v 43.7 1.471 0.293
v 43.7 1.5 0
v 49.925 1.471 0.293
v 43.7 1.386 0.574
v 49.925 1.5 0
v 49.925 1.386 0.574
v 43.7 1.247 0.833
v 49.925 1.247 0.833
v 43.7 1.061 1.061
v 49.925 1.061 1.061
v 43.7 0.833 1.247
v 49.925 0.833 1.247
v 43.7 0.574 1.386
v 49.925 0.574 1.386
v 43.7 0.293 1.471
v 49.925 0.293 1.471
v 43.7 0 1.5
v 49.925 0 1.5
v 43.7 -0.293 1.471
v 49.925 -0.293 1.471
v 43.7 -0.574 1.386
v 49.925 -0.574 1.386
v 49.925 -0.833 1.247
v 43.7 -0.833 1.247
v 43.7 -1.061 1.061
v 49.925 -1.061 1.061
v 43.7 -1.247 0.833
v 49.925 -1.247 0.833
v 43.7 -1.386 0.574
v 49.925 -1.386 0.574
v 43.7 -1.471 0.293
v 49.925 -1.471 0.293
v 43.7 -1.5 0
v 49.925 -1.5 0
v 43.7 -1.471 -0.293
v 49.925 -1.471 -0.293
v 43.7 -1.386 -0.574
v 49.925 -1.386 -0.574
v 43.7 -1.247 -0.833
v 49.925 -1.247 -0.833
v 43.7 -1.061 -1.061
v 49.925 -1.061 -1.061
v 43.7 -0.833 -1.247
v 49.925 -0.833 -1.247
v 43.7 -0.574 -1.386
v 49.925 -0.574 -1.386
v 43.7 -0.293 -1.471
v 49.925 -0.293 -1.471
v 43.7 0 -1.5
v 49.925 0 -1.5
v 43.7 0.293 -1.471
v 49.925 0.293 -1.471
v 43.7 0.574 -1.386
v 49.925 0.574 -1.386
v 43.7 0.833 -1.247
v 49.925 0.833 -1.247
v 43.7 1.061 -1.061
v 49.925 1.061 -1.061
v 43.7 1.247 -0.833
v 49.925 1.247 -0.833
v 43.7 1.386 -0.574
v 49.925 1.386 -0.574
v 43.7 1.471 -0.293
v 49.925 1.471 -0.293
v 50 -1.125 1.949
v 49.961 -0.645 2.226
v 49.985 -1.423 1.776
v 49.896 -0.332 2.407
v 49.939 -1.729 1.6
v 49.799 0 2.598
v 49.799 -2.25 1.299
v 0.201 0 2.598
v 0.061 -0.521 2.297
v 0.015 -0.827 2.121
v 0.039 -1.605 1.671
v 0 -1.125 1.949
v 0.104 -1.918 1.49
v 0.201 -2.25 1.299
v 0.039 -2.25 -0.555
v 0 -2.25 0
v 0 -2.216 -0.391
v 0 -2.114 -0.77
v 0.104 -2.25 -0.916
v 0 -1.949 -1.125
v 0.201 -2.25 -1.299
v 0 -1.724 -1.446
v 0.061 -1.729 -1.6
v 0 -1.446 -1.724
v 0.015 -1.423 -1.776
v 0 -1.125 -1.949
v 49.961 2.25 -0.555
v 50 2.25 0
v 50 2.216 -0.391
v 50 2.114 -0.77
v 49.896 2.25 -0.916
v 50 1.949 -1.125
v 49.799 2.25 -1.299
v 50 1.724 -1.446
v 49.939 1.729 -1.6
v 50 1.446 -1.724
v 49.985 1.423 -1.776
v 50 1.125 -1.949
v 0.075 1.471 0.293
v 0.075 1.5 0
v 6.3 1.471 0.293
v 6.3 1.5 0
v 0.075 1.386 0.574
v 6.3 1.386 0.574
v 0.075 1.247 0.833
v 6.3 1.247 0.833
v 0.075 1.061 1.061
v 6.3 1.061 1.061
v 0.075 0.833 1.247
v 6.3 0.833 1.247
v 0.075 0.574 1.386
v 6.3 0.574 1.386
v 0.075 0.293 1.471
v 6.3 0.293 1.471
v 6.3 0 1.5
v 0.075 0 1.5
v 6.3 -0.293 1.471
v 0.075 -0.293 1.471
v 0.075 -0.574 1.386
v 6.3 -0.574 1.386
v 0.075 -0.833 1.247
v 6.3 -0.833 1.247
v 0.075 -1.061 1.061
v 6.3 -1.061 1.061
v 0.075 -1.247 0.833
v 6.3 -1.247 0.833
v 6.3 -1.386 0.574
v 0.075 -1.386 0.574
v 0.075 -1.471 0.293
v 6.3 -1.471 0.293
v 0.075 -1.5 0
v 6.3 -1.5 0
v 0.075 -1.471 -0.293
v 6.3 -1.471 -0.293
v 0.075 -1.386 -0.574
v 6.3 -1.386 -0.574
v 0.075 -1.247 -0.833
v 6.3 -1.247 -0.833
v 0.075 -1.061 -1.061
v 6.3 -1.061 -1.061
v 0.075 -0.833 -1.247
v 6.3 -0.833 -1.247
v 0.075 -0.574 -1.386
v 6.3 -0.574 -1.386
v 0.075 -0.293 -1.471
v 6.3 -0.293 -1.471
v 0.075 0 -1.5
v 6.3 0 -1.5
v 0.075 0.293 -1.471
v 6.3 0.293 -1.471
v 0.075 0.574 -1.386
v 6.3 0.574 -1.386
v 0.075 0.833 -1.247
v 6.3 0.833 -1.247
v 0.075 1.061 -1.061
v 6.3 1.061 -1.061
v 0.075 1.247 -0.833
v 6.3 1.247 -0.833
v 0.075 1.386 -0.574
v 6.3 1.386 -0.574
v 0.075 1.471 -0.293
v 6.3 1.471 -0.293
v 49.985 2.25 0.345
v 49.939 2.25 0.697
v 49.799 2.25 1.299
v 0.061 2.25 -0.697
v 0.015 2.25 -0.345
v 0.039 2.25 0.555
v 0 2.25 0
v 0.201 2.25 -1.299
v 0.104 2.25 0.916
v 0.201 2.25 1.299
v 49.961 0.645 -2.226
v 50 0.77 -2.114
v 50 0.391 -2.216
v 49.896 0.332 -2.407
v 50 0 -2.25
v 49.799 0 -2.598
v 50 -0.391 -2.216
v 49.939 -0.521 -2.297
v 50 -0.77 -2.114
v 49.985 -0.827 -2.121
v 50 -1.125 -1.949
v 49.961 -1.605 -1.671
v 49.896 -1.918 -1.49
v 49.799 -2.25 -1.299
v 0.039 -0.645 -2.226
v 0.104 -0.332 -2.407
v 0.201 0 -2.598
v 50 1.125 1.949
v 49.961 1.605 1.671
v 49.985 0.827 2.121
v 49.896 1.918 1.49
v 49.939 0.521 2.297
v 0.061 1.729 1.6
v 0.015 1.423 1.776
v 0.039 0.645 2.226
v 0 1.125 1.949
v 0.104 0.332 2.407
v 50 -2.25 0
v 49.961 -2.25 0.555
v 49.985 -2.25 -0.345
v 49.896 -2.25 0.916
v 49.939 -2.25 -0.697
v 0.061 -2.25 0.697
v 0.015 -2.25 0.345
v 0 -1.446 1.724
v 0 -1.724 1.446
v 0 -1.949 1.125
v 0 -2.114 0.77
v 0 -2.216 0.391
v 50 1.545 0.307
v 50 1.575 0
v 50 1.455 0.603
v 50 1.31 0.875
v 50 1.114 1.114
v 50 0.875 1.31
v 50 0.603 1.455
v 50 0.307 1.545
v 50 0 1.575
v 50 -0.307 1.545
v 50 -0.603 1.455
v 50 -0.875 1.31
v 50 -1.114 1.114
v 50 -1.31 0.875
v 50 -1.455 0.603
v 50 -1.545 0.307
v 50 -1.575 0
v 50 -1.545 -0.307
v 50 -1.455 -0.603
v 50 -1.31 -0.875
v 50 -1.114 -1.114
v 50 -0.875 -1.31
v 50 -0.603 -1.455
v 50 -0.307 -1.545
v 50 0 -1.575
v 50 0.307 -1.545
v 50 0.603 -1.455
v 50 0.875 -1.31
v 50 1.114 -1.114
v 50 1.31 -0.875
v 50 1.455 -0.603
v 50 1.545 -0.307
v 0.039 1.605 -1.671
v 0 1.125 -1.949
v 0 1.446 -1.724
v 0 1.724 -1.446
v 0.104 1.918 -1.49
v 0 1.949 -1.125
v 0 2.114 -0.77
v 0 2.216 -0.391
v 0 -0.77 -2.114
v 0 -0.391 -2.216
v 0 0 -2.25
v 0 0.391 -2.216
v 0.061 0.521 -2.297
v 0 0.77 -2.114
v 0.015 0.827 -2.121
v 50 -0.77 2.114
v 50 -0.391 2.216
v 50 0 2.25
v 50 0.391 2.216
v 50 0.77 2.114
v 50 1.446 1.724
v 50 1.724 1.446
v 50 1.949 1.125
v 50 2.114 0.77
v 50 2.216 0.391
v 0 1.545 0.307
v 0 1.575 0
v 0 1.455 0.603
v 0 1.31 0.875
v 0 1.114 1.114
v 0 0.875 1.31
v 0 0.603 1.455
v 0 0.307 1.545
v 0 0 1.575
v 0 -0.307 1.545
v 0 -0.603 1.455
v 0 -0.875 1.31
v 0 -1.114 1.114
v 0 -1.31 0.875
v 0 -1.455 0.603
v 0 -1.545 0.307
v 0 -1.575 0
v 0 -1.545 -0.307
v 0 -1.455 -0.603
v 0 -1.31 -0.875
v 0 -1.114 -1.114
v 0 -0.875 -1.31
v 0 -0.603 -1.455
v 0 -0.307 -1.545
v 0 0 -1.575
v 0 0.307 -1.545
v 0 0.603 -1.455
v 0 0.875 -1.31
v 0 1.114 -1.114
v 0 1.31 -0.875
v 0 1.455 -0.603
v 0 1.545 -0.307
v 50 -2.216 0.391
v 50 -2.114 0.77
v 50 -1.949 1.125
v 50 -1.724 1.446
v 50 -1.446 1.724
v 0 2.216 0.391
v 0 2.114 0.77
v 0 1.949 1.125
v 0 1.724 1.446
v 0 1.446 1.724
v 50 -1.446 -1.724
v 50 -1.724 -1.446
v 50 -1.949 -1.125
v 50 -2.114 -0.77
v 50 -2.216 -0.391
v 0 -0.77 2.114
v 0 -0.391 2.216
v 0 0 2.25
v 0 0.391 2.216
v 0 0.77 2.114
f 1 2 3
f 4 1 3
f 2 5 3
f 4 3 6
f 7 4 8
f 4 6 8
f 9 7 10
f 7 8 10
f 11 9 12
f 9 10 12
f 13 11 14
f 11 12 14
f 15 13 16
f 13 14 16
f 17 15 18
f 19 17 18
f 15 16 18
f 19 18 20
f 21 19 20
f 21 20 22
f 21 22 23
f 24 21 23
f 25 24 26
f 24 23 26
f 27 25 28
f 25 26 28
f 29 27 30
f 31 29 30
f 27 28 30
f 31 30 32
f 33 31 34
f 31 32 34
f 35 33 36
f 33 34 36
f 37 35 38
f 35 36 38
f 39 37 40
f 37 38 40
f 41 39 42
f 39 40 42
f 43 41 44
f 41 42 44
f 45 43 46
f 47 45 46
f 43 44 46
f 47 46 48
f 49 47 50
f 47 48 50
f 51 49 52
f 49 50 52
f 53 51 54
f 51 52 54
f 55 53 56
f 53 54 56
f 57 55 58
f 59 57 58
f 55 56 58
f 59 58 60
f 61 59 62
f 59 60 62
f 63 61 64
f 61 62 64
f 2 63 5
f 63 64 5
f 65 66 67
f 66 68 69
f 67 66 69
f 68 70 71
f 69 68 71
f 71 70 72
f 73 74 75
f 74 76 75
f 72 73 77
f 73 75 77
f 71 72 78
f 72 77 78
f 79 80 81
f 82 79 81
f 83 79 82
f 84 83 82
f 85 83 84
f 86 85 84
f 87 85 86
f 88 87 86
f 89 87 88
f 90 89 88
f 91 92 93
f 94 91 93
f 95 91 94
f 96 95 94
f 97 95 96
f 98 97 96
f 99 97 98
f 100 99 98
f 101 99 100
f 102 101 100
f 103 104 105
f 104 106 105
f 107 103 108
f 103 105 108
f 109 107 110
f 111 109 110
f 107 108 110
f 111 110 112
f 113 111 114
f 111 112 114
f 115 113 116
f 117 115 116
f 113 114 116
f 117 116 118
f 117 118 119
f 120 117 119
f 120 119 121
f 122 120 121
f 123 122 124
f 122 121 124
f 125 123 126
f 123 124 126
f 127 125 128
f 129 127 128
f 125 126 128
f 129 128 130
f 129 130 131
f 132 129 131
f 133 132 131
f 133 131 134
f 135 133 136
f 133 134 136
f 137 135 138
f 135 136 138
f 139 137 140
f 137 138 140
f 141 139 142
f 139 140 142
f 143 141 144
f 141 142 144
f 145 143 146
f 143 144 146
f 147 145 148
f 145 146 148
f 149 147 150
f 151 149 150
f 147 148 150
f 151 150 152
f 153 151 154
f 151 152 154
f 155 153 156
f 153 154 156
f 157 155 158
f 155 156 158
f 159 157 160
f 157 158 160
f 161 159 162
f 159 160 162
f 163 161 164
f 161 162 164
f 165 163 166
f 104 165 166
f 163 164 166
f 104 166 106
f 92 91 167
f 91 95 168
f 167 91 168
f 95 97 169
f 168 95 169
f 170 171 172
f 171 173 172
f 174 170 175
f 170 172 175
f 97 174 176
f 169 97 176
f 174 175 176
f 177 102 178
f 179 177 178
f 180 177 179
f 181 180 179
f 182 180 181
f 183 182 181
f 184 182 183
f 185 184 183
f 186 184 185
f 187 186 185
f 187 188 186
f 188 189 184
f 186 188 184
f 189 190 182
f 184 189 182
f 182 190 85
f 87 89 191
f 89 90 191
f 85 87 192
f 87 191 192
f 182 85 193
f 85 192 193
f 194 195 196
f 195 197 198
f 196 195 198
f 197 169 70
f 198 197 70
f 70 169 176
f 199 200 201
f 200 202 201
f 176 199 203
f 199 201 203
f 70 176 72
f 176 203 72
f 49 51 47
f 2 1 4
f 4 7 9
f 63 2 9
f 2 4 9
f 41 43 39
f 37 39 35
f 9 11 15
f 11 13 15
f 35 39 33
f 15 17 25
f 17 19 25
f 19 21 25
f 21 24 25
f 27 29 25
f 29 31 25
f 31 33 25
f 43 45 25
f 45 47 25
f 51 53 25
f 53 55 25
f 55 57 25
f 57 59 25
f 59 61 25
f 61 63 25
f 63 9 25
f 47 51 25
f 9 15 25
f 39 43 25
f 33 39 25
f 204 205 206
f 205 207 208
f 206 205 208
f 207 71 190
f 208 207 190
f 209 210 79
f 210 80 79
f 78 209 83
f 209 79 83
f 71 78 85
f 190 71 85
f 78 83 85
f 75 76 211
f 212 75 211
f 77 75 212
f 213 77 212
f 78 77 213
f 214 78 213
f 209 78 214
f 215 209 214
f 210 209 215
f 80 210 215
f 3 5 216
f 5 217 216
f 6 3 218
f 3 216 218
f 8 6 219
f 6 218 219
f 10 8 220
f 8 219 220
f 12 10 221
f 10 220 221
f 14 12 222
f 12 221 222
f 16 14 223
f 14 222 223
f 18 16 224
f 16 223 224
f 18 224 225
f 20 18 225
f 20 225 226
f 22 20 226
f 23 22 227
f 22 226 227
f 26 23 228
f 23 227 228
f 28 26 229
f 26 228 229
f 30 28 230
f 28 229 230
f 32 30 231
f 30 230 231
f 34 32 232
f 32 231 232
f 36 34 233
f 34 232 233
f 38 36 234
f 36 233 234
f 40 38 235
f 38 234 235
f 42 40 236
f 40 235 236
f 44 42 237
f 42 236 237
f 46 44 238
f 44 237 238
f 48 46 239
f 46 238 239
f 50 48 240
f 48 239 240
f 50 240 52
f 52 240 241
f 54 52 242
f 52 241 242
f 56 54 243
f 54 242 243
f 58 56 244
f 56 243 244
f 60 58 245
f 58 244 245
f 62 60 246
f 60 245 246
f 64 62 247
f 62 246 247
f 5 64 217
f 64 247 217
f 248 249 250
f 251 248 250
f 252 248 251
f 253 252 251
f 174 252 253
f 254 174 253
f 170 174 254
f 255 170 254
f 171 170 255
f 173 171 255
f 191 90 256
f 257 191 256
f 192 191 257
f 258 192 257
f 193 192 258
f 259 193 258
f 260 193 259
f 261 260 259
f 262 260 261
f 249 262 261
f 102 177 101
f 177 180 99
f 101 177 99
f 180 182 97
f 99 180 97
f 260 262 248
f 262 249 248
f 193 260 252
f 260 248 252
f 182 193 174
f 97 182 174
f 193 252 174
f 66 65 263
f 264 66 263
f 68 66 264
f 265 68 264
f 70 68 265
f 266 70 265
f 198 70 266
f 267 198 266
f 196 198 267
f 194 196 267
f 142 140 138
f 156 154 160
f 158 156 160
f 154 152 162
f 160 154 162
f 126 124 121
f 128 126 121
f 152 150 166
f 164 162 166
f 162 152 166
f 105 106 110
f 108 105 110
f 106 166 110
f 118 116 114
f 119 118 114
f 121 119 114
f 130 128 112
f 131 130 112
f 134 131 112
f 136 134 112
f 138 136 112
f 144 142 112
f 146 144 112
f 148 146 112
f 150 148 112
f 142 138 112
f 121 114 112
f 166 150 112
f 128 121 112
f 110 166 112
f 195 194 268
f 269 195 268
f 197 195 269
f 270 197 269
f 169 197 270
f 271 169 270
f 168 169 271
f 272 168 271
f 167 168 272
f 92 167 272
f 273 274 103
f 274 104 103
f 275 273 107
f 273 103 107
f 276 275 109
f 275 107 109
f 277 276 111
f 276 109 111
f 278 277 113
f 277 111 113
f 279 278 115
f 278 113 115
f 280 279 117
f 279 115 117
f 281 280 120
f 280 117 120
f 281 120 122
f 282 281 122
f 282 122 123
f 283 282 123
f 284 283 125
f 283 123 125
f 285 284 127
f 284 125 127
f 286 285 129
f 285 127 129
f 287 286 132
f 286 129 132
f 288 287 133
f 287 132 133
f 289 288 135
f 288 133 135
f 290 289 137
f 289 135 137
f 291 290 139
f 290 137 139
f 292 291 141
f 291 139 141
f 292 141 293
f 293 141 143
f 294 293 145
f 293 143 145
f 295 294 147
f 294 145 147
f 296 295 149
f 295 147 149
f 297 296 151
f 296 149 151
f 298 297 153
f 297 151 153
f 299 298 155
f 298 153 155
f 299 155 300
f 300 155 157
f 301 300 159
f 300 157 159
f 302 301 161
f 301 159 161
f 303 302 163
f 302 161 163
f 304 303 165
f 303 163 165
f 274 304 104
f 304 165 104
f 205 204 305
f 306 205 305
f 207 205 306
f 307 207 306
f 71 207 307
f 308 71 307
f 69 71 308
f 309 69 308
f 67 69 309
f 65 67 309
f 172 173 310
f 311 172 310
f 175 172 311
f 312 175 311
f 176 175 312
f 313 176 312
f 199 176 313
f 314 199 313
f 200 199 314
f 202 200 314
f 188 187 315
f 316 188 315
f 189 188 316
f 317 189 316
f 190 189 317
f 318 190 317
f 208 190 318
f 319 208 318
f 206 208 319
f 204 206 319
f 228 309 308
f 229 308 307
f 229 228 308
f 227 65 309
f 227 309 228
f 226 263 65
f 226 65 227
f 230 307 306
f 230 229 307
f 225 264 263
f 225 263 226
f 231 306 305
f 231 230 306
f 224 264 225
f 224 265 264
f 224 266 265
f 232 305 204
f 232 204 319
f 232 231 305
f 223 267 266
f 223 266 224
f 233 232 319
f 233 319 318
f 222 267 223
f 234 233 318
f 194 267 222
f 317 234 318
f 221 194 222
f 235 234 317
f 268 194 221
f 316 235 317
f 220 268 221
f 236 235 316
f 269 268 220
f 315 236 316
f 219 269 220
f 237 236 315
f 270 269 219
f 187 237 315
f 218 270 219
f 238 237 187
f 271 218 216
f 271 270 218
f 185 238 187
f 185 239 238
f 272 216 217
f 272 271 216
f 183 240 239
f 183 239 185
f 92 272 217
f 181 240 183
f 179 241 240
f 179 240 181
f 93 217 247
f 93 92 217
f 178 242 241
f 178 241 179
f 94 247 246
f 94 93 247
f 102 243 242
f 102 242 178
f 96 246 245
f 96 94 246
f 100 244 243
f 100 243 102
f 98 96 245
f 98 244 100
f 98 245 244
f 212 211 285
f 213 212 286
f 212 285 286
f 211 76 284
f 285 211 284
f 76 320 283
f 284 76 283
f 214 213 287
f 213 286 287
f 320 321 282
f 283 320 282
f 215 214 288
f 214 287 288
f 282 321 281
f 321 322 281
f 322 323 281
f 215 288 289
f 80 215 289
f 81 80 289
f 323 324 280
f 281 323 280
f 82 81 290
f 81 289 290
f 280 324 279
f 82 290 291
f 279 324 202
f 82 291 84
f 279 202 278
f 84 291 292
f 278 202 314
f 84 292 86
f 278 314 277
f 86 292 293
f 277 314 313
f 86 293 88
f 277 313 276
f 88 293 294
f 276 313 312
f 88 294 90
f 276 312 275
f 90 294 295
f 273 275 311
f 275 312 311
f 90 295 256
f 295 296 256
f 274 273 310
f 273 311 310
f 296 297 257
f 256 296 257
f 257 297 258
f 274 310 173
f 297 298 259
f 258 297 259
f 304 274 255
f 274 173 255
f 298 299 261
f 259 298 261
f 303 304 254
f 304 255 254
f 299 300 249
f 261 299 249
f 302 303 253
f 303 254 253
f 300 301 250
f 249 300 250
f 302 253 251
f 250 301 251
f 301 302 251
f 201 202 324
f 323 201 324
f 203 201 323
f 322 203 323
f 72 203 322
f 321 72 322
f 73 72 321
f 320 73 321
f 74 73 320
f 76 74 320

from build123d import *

# Parameters (mm, degrees)
BOSS_EXTRUDE1_DEPTH = 50
SKETCH4_OUTSIDE_W   = 193.96
SKETCH4_OUTSIDE_H   = 193.264
SKETCH4_OUTSIDE_R   = 2.25
CUT_EXTRUDE1_DEPTH  = 51
CUT_EXTRUDE1_TAPER  = 60
SKETCH5_OUTSIDE_W   = 193.96
SKETCH5_OUTSIDE_H   = 193.264
SKETCH5_OUTSIDE_R   = 2.25
CUT_EXTRUDE2_DEPTH  = 51
CUT_EXTRUDE2_TAPER  = 60


with BuildPart() as part:
    # Sketch2 → Boss-Extrude1 (new body)
    with BuildSketch(Plane(origin=(0, 0, 0), x_dir=(0, 0, -1), z_dir=(1, 0, 0))):
        Polygon((1.299038106, 2.25), (-1.299038106, 2.25), (-2.598076211, 0), (-1.299038106, -2.25), (1.299038106, -2.25), (2.598076211, 0), align=None)
    extrude(amount=BOSS_EXTRUDE1_DEPTH)

    # Sketch3 → Cut-Revolve1 (revolve, cut)
    with BuildSketch(Plane.XY):
        Polygon((0, 1.575), (0.075, 1.5), (6.3, 1.5), (6.3, 0), (0, 0), align=None)
        Polygon((50, 0), (43.7, 0), (43.7, 1.5), (49.925, 1.5), (50, 1.575), align=None)
    revolve(axis=Axis((0, 0, 0), (1, 0, 0)), mode=Mode.SUBTRACT)

    # Sketch4 outside → Cut-Extrude1 (cut, through all)
    with BuildSketch(Plane.ZY):
        Rectangle(SKETCH4_OUTSIDE_W, SKETCH4_OUTSIDE_H)
        Circle(SKETCH4_OUTSIDE_R, mode=Mode.SUBTRACT)
    extrude(amount=-CUT_EXTRUDE1_DEPTH, taper=CUT_EXTRUDE1_TAPER, mode=Mode.SUBTRACT)

    # Sketch5 outside → Cut-Extrude2 (cut, through all)
    with BuildSketch(Plane(origin=(50, 0, 0), x_dir=(0, 0, -1), z_dir=(1, 0, 0))):
        Rectangle(SKETCH5_OUTSIDE_W, SKETCH5_OUTSIDE_H)
        Circle(SKETCH5_OUTSIDE_R, mode=Mode.SUBTRACT)
    extrude(amount=-CUT_EXTRUDE2_DEPTH, taper=CUT_EXTRUDE2_TAPER, mode=Mode.SUBTRACT)


solid = part.part
